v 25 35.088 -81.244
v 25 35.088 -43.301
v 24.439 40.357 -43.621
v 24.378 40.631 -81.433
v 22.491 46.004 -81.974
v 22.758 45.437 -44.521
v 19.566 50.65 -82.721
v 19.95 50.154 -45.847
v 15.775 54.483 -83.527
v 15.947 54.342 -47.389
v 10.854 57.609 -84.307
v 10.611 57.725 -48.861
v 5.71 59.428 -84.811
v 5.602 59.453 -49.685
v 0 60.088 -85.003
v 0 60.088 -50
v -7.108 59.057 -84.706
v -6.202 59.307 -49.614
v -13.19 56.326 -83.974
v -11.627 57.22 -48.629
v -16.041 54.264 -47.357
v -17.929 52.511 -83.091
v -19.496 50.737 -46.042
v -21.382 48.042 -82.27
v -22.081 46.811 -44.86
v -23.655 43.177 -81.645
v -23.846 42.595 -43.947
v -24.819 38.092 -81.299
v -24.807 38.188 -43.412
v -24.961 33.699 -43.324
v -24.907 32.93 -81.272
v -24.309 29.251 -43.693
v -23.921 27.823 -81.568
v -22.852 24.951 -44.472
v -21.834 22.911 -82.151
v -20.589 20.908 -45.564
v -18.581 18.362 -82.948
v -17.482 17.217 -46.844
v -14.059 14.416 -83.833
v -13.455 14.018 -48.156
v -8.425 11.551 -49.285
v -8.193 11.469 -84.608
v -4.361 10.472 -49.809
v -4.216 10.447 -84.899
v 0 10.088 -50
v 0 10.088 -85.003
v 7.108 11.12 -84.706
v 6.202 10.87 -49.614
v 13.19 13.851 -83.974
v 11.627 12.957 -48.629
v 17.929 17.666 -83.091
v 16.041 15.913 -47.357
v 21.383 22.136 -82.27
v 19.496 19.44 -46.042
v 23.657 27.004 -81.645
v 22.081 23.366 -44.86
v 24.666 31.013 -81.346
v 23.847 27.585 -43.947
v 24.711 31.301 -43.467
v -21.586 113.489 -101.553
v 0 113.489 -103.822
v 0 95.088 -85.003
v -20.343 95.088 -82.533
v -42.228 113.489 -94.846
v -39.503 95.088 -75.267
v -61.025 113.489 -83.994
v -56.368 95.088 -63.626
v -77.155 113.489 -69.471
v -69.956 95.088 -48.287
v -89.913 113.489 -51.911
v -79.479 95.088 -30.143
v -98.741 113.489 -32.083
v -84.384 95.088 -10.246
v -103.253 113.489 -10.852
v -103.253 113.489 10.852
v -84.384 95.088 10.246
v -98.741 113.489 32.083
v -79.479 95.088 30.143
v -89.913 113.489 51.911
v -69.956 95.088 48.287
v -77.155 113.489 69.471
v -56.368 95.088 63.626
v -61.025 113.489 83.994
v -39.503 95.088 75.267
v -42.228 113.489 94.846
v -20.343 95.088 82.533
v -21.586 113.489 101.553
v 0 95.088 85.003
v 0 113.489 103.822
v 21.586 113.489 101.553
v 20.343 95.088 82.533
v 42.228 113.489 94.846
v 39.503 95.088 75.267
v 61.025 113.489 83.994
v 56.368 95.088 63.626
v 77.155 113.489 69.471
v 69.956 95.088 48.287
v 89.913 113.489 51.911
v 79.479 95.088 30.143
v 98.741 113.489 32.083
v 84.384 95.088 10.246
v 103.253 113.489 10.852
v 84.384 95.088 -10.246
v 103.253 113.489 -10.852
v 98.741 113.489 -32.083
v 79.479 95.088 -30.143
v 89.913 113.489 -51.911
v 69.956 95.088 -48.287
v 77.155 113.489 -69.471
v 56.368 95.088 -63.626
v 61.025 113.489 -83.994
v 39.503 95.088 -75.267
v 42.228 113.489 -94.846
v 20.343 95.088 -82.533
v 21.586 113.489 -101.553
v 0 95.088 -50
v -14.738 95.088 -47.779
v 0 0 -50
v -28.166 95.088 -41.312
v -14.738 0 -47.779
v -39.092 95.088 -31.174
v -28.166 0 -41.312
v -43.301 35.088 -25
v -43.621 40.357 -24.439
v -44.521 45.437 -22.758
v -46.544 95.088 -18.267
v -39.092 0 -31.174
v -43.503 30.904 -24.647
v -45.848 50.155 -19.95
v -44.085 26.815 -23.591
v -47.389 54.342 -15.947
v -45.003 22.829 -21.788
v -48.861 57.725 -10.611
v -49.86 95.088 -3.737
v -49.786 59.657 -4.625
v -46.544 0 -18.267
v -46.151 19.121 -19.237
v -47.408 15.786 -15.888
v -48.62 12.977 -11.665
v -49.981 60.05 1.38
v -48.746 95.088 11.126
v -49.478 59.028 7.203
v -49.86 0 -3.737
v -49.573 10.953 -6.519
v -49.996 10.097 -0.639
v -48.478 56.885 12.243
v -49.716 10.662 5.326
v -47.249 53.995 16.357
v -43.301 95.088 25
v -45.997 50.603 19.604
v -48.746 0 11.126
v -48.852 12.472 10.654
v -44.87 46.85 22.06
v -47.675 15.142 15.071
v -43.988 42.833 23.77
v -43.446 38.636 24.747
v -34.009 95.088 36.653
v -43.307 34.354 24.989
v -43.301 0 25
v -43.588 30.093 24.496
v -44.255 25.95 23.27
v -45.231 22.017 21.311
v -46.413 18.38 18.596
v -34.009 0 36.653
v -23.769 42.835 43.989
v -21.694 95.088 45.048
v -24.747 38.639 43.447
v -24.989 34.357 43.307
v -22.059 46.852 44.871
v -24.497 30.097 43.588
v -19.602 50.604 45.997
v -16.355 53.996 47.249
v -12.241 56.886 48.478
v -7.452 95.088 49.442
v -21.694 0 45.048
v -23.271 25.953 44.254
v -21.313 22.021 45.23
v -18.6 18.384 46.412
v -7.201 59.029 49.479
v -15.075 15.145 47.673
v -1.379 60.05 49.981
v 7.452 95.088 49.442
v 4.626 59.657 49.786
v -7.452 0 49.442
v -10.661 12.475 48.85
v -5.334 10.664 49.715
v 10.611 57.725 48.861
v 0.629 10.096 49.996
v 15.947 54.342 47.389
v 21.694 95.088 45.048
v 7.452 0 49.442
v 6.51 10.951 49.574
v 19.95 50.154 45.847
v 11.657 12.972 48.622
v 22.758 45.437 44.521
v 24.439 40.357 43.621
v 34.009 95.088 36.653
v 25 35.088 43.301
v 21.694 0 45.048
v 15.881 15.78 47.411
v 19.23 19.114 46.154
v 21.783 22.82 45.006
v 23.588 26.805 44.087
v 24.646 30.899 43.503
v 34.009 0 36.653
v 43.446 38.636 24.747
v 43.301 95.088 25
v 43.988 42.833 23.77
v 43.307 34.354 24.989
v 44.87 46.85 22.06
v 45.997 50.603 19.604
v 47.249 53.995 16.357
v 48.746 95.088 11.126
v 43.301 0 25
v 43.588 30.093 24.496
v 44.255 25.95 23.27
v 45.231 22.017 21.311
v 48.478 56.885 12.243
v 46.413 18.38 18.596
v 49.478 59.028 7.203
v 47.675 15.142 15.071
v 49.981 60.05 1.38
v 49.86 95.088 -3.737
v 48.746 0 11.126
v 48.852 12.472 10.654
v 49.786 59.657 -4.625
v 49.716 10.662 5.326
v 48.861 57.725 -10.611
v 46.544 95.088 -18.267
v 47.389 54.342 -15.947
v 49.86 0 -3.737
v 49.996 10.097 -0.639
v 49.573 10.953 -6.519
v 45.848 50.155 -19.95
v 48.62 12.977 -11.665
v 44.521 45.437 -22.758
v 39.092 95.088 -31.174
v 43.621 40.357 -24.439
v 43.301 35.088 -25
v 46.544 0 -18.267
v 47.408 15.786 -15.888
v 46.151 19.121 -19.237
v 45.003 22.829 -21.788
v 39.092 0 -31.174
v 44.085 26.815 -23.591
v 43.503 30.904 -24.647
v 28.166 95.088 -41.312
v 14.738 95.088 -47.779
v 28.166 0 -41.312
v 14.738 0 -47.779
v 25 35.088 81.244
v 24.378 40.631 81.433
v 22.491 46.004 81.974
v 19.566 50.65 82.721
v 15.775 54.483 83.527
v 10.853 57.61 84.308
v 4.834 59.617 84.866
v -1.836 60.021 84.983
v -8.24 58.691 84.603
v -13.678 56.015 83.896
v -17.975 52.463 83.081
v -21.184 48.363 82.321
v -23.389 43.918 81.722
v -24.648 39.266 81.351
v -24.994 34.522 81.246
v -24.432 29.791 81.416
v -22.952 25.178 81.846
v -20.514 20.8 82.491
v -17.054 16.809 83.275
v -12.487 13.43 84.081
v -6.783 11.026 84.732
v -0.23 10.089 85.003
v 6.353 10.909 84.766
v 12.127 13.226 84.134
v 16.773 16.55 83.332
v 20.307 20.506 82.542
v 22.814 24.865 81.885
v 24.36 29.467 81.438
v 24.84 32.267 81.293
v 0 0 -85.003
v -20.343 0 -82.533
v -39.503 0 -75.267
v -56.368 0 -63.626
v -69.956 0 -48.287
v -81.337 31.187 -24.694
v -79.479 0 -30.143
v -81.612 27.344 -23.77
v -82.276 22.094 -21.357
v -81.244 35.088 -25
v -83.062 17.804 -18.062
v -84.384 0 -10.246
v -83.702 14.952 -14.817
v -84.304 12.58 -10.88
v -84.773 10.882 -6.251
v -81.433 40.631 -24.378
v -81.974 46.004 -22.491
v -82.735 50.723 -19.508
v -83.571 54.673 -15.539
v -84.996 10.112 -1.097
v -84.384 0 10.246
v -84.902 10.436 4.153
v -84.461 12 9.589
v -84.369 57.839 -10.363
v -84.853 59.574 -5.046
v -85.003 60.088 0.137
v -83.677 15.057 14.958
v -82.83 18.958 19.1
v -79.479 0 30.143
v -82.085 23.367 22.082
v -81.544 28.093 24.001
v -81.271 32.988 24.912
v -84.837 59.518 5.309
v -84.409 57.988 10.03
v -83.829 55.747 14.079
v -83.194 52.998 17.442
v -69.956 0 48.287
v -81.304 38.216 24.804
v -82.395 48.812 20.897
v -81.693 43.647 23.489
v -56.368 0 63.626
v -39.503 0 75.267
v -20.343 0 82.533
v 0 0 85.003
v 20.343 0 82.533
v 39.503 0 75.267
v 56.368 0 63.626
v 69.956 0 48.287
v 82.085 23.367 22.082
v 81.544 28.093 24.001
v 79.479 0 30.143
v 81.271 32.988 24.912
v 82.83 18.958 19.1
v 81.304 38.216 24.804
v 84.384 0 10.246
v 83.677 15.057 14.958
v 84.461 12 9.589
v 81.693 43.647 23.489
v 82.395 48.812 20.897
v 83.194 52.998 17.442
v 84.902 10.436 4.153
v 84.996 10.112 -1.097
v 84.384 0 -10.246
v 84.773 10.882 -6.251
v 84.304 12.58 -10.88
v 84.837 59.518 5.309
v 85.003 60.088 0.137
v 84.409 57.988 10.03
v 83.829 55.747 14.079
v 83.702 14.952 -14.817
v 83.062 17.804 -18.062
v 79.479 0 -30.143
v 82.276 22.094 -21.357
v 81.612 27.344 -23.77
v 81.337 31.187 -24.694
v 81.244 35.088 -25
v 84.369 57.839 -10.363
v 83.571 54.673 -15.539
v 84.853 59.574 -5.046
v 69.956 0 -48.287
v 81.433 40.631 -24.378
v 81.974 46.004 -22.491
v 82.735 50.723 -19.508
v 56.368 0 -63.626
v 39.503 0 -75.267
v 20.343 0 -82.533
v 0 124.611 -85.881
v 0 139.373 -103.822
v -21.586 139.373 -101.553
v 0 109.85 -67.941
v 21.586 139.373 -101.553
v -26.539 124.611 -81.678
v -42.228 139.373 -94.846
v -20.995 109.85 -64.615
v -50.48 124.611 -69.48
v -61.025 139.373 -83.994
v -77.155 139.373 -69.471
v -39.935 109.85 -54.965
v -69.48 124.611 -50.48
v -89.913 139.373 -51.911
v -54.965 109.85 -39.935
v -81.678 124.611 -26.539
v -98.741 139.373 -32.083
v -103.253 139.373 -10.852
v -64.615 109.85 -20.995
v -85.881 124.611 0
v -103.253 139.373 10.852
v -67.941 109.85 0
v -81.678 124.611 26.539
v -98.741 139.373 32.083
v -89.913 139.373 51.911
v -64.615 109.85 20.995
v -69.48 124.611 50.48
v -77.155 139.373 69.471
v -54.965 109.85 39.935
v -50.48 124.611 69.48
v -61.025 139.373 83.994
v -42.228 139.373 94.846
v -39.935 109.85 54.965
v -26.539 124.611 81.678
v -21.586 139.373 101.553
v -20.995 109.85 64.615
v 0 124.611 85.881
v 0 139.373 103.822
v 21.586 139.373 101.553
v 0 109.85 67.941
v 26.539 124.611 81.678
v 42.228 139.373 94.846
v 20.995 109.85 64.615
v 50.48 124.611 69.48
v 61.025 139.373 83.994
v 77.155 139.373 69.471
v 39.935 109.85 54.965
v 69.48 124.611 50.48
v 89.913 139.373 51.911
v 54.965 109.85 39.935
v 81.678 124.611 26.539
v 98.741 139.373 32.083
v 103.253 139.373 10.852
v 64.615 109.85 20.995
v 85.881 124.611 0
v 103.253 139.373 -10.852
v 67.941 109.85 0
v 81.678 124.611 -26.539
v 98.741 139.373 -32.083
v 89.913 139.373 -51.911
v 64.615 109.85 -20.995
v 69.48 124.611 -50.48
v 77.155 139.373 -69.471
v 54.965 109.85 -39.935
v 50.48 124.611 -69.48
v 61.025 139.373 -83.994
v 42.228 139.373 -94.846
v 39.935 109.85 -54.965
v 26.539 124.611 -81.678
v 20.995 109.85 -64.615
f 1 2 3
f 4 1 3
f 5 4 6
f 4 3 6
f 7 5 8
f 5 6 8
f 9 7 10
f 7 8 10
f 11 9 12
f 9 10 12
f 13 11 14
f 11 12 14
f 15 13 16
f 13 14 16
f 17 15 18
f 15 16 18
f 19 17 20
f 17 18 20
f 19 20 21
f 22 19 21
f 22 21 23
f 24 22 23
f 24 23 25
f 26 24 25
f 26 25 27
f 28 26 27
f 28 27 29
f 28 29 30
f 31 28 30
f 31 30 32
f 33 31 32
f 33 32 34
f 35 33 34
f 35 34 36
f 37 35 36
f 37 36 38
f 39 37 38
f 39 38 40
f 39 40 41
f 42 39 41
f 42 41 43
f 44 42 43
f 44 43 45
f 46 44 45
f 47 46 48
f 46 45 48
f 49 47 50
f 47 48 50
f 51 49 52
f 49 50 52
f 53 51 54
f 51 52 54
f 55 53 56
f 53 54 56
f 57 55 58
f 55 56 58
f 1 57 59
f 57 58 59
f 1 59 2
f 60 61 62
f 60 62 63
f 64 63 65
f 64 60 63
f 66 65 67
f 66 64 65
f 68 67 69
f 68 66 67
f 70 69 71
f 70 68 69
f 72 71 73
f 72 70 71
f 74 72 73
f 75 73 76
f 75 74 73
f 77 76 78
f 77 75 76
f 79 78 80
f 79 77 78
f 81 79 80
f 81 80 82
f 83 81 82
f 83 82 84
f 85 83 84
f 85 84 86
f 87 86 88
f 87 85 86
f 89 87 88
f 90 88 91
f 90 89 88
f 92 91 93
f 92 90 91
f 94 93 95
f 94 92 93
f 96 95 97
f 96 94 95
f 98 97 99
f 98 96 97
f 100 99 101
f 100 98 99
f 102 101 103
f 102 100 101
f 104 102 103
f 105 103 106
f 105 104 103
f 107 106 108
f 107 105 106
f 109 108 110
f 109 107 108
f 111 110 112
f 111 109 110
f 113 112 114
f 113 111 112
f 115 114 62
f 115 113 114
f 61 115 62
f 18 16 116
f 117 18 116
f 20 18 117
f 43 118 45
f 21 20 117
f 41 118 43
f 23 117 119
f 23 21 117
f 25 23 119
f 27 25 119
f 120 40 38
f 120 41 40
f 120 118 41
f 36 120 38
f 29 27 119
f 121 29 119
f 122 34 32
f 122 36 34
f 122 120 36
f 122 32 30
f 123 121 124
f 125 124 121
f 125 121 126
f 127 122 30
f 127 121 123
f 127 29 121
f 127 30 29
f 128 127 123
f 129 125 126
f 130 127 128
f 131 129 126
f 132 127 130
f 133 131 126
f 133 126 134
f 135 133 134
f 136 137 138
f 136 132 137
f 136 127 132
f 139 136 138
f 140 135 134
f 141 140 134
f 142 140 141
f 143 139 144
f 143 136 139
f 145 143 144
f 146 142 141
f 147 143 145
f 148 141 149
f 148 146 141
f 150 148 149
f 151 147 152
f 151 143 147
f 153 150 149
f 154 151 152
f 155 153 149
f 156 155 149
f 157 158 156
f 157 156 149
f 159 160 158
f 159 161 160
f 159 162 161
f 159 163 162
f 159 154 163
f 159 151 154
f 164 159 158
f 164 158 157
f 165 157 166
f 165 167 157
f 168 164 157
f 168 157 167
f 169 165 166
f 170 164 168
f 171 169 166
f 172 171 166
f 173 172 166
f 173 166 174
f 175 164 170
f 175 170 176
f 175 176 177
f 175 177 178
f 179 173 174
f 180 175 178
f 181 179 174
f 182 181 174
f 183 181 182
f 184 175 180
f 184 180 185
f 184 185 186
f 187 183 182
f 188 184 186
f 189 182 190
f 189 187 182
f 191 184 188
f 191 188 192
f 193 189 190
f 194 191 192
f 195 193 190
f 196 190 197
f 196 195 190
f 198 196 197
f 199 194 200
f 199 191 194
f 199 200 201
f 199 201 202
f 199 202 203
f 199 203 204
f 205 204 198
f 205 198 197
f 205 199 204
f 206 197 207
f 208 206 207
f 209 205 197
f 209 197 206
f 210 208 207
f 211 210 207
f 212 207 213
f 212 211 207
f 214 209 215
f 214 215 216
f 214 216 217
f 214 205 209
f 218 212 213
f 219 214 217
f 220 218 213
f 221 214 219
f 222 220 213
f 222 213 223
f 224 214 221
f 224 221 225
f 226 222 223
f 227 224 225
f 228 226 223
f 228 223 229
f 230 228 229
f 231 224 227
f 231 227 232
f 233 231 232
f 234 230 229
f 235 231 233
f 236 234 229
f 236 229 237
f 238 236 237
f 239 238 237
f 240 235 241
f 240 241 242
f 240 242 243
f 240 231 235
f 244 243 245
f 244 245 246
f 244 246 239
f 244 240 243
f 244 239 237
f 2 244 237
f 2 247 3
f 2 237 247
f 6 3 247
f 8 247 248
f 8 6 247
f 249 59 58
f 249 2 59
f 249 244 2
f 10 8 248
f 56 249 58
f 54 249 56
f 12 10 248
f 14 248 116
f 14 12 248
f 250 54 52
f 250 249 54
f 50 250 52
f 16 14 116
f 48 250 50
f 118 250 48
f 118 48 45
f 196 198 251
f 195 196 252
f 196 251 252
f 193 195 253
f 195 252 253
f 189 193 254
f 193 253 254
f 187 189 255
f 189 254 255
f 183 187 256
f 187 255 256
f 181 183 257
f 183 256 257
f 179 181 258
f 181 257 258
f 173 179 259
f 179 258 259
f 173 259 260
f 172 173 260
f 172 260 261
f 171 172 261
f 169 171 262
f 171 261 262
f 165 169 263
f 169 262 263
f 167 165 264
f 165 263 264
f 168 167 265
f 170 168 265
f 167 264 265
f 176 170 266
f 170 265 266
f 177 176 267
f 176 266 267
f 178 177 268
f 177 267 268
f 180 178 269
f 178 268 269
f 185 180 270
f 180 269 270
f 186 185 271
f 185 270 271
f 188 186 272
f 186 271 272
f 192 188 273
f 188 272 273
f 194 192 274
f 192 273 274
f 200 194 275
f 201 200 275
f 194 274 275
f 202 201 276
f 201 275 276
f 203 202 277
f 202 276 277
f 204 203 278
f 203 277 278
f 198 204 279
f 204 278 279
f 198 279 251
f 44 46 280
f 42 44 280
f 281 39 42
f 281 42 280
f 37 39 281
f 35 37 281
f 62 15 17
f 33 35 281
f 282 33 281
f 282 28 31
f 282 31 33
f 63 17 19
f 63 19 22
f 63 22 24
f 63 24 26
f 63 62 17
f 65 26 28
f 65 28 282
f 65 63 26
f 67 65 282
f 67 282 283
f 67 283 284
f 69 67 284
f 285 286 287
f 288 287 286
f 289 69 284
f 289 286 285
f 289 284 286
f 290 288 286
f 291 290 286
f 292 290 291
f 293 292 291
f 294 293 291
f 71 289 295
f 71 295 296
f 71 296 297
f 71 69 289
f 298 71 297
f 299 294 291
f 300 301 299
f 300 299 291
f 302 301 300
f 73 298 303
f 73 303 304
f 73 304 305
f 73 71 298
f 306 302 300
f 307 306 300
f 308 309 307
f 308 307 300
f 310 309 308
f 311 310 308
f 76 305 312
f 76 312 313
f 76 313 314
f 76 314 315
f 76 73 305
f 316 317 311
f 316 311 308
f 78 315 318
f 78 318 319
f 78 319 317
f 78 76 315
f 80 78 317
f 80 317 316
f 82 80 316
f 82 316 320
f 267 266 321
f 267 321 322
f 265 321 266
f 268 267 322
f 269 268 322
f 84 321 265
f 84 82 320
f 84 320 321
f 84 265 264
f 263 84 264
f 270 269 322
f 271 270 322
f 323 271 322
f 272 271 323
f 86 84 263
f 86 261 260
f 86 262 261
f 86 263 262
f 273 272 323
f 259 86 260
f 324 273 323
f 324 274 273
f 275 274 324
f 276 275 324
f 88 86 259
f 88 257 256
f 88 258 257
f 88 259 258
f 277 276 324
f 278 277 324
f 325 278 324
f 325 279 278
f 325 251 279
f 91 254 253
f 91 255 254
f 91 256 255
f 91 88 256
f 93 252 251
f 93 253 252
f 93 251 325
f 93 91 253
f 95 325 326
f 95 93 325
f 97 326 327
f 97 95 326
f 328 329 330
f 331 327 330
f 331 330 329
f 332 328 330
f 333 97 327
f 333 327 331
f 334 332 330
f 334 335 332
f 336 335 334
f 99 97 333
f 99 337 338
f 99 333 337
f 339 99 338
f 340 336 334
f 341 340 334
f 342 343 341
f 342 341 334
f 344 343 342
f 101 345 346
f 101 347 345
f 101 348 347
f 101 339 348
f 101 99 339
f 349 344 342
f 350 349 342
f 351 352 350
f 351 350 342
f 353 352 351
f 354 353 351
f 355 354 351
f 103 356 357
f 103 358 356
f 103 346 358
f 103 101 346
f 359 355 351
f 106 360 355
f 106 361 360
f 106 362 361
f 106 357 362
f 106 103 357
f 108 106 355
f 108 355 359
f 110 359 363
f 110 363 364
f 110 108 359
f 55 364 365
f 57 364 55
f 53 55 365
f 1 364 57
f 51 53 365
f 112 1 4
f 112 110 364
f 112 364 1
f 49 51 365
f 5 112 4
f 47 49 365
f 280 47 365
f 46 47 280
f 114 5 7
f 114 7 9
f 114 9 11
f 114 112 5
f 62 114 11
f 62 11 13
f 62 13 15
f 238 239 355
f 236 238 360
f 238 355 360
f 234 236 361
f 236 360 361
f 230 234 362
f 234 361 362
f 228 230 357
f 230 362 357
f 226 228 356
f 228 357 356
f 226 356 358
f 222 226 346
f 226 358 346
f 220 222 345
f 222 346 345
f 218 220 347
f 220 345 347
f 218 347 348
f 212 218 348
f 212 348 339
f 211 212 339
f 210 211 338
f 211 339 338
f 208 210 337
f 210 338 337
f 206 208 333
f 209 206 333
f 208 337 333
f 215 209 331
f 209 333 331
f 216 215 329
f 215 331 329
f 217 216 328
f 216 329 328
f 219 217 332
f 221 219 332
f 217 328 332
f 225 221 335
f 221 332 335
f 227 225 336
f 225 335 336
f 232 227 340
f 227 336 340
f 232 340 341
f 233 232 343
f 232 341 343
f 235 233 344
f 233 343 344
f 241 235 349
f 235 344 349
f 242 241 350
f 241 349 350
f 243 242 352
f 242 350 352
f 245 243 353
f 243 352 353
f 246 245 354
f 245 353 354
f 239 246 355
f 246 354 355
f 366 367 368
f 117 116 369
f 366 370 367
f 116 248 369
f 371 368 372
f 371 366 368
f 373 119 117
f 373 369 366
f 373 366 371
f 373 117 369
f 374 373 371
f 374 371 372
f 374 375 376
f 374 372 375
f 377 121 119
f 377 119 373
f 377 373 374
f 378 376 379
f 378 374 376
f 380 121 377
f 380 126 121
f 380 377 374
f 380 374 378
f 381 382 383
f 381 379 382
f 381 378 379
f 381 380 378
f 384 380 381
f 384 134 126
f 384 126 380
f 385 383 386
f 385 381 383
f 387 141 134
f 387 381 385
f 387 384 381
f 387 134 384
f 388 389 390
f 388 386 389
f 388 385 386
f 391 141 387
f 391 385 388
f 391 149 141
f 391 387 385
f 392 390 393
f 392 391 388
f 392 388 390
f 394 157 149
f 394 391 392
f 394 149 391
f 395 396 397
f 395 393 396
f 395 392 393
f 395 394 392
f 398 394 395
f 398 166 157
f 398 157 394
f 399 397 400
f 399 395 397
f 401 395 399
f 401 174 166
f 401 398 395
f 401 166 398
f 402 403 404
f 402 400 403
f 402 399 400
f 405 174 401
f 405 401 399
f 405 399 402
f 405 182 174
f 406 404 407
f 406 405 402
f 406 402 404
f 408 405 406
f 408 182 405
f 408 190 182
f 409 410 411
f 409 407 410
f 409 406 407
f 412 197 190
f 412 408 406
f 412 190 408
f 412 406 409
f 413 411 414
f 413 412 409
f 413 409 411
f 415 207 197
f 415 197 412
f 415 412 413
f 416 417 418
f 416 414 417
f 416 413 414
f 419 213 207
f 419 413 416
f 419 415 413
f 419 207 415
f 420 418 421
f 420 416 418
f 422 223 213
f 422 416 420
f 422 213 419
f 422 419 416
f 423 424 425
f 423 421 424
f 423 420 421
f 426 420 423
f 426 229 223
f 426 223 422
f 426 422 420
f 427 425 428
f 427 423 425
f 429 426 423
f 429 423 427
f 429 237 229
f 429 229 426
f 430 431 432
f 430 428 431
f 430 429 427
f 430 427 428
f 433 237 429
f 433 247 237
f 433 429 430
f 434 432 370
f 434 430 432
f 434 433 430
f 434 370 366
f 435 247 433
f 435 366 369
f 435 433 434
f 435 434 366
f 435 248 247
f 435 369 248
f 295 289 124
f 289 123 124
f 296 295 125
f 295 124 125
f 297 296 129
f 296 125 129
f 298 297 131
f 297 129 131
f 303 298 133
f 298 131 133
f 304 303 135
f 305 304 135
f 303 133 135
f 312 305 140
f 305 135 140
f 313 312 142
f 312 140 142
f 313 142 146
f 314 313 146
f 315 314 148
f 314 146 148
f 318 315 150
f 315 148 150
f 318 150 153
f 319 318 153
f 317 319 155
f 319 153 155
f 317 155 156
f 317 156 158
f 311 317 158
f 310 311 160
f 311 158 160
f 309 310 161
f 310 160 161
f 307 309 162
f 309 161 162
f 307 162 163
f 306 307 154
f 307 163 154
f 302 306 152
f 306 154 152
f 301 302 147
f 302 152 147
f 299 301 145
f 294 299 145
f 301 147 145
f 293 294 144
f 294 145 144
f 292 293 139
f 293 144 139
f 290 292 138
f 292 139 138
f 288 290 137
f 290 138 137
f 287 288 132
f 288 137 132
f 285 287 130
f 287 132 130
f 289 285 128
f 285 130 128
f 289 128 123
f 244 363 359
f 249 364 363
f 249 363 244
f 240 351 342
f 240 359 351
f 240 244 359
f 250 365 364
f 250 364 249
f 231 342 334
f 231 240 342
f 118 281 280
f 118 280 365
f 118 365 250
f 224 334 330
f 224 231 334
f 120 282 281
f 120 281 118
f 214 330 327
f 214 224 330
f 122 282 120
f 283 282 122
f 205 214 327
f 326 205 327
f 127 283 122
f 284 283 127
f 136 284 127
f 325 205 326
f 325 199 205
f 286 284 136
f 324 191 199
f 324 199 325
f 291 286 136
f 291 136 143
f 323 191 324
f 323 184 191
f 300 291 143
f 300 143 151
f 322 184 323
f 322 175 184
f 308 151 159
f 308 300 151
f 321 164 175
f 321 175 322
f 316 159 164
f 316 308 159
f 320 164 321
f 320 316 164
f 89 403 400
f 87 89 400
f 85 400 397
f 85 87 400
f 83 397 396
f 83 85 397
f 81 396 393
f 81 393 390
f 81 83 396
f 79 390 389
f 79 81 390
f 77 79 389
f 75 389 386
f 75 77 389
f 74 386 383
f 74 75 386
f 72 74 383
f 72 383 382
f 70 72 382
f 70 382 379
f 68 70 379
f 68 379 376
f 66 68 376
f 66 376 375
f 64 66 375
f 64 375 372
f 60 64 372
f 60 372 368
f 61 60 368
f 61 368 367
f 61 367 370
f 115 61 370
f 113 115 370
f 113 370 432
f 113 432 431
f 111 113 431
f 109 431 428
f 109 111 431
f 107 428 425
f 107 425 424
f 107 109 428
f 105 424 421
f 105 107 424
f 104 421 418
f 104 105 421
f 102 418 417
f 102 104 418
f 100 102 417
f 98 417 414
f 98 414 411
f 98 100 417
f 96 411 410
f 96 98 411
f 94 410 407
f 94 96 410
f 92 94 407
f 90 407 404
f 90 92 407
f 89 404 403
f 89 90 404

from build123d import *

# Parameters (mm, degrees)
SKETCH9_R          = 25
CUT_EXTRUDE1_DEPTH = 100
SKETCH10_R         = 25
CUT_EXTRUDE2_DEPTH = 100
SKETCH11_R         = 149.836280288
SKETCH11_R_2       = 103.82223994
CUT_EXTRUDE3_DEPTH = 265.609047568


with BuildPart() as part:
    # Sketch5 → Revolve3 (revolve)
    with BuildSketch(Plane.XY):
        Polygon((-85.003274394, 95.088408644), (-85.003274394, 0), (-50, 0), (-50, 95.088408644), (-127.045813647, 158.480681074), (-149.836280288, 158.480681074), align=None)
    revolve(axis=Axis((0, -87.884741323, 0), (0, 1, 0)))

    # Sketch9 → Cut-Extrude1 (cut, symmetric)
    with BuildSketch(Plane.XY):
        with Locations((0, 35.088408644)):
            Circle(SKETCH9_R)
    extrude(amount=CUT_EXTRUDE1_DEPTH, both=True, mode=Mode.SUBTRACT)

    # Sketch10 → Cut-Extrude2 (cut, symmetric)
    with BuildSketch(Plane(origin=(0, 0, 0), x_dir=(0, 0, -1), z_dir=(1, 0, 0))):
        with Locations((0, 35.088408644)):
            Circle(SKETCH10_R)
    extrude(amount=CUT_EXTRUDE2_DEPTH, both=True, mode=Mode.SUBTRACT)

    # Sketch11 → Cut-Extrude3 (cut, through all)
    with BuildSketch(Plane.XZ):
        Circle(SKETCH11_R)
        Circle(SKETCH11_R_2, mode=Mode.SUBTRACT)
    extrude(amount=-CUT_EXTRUDE3_DEPTH, mode=Mode.SUBTRACT)


solid = part.part
